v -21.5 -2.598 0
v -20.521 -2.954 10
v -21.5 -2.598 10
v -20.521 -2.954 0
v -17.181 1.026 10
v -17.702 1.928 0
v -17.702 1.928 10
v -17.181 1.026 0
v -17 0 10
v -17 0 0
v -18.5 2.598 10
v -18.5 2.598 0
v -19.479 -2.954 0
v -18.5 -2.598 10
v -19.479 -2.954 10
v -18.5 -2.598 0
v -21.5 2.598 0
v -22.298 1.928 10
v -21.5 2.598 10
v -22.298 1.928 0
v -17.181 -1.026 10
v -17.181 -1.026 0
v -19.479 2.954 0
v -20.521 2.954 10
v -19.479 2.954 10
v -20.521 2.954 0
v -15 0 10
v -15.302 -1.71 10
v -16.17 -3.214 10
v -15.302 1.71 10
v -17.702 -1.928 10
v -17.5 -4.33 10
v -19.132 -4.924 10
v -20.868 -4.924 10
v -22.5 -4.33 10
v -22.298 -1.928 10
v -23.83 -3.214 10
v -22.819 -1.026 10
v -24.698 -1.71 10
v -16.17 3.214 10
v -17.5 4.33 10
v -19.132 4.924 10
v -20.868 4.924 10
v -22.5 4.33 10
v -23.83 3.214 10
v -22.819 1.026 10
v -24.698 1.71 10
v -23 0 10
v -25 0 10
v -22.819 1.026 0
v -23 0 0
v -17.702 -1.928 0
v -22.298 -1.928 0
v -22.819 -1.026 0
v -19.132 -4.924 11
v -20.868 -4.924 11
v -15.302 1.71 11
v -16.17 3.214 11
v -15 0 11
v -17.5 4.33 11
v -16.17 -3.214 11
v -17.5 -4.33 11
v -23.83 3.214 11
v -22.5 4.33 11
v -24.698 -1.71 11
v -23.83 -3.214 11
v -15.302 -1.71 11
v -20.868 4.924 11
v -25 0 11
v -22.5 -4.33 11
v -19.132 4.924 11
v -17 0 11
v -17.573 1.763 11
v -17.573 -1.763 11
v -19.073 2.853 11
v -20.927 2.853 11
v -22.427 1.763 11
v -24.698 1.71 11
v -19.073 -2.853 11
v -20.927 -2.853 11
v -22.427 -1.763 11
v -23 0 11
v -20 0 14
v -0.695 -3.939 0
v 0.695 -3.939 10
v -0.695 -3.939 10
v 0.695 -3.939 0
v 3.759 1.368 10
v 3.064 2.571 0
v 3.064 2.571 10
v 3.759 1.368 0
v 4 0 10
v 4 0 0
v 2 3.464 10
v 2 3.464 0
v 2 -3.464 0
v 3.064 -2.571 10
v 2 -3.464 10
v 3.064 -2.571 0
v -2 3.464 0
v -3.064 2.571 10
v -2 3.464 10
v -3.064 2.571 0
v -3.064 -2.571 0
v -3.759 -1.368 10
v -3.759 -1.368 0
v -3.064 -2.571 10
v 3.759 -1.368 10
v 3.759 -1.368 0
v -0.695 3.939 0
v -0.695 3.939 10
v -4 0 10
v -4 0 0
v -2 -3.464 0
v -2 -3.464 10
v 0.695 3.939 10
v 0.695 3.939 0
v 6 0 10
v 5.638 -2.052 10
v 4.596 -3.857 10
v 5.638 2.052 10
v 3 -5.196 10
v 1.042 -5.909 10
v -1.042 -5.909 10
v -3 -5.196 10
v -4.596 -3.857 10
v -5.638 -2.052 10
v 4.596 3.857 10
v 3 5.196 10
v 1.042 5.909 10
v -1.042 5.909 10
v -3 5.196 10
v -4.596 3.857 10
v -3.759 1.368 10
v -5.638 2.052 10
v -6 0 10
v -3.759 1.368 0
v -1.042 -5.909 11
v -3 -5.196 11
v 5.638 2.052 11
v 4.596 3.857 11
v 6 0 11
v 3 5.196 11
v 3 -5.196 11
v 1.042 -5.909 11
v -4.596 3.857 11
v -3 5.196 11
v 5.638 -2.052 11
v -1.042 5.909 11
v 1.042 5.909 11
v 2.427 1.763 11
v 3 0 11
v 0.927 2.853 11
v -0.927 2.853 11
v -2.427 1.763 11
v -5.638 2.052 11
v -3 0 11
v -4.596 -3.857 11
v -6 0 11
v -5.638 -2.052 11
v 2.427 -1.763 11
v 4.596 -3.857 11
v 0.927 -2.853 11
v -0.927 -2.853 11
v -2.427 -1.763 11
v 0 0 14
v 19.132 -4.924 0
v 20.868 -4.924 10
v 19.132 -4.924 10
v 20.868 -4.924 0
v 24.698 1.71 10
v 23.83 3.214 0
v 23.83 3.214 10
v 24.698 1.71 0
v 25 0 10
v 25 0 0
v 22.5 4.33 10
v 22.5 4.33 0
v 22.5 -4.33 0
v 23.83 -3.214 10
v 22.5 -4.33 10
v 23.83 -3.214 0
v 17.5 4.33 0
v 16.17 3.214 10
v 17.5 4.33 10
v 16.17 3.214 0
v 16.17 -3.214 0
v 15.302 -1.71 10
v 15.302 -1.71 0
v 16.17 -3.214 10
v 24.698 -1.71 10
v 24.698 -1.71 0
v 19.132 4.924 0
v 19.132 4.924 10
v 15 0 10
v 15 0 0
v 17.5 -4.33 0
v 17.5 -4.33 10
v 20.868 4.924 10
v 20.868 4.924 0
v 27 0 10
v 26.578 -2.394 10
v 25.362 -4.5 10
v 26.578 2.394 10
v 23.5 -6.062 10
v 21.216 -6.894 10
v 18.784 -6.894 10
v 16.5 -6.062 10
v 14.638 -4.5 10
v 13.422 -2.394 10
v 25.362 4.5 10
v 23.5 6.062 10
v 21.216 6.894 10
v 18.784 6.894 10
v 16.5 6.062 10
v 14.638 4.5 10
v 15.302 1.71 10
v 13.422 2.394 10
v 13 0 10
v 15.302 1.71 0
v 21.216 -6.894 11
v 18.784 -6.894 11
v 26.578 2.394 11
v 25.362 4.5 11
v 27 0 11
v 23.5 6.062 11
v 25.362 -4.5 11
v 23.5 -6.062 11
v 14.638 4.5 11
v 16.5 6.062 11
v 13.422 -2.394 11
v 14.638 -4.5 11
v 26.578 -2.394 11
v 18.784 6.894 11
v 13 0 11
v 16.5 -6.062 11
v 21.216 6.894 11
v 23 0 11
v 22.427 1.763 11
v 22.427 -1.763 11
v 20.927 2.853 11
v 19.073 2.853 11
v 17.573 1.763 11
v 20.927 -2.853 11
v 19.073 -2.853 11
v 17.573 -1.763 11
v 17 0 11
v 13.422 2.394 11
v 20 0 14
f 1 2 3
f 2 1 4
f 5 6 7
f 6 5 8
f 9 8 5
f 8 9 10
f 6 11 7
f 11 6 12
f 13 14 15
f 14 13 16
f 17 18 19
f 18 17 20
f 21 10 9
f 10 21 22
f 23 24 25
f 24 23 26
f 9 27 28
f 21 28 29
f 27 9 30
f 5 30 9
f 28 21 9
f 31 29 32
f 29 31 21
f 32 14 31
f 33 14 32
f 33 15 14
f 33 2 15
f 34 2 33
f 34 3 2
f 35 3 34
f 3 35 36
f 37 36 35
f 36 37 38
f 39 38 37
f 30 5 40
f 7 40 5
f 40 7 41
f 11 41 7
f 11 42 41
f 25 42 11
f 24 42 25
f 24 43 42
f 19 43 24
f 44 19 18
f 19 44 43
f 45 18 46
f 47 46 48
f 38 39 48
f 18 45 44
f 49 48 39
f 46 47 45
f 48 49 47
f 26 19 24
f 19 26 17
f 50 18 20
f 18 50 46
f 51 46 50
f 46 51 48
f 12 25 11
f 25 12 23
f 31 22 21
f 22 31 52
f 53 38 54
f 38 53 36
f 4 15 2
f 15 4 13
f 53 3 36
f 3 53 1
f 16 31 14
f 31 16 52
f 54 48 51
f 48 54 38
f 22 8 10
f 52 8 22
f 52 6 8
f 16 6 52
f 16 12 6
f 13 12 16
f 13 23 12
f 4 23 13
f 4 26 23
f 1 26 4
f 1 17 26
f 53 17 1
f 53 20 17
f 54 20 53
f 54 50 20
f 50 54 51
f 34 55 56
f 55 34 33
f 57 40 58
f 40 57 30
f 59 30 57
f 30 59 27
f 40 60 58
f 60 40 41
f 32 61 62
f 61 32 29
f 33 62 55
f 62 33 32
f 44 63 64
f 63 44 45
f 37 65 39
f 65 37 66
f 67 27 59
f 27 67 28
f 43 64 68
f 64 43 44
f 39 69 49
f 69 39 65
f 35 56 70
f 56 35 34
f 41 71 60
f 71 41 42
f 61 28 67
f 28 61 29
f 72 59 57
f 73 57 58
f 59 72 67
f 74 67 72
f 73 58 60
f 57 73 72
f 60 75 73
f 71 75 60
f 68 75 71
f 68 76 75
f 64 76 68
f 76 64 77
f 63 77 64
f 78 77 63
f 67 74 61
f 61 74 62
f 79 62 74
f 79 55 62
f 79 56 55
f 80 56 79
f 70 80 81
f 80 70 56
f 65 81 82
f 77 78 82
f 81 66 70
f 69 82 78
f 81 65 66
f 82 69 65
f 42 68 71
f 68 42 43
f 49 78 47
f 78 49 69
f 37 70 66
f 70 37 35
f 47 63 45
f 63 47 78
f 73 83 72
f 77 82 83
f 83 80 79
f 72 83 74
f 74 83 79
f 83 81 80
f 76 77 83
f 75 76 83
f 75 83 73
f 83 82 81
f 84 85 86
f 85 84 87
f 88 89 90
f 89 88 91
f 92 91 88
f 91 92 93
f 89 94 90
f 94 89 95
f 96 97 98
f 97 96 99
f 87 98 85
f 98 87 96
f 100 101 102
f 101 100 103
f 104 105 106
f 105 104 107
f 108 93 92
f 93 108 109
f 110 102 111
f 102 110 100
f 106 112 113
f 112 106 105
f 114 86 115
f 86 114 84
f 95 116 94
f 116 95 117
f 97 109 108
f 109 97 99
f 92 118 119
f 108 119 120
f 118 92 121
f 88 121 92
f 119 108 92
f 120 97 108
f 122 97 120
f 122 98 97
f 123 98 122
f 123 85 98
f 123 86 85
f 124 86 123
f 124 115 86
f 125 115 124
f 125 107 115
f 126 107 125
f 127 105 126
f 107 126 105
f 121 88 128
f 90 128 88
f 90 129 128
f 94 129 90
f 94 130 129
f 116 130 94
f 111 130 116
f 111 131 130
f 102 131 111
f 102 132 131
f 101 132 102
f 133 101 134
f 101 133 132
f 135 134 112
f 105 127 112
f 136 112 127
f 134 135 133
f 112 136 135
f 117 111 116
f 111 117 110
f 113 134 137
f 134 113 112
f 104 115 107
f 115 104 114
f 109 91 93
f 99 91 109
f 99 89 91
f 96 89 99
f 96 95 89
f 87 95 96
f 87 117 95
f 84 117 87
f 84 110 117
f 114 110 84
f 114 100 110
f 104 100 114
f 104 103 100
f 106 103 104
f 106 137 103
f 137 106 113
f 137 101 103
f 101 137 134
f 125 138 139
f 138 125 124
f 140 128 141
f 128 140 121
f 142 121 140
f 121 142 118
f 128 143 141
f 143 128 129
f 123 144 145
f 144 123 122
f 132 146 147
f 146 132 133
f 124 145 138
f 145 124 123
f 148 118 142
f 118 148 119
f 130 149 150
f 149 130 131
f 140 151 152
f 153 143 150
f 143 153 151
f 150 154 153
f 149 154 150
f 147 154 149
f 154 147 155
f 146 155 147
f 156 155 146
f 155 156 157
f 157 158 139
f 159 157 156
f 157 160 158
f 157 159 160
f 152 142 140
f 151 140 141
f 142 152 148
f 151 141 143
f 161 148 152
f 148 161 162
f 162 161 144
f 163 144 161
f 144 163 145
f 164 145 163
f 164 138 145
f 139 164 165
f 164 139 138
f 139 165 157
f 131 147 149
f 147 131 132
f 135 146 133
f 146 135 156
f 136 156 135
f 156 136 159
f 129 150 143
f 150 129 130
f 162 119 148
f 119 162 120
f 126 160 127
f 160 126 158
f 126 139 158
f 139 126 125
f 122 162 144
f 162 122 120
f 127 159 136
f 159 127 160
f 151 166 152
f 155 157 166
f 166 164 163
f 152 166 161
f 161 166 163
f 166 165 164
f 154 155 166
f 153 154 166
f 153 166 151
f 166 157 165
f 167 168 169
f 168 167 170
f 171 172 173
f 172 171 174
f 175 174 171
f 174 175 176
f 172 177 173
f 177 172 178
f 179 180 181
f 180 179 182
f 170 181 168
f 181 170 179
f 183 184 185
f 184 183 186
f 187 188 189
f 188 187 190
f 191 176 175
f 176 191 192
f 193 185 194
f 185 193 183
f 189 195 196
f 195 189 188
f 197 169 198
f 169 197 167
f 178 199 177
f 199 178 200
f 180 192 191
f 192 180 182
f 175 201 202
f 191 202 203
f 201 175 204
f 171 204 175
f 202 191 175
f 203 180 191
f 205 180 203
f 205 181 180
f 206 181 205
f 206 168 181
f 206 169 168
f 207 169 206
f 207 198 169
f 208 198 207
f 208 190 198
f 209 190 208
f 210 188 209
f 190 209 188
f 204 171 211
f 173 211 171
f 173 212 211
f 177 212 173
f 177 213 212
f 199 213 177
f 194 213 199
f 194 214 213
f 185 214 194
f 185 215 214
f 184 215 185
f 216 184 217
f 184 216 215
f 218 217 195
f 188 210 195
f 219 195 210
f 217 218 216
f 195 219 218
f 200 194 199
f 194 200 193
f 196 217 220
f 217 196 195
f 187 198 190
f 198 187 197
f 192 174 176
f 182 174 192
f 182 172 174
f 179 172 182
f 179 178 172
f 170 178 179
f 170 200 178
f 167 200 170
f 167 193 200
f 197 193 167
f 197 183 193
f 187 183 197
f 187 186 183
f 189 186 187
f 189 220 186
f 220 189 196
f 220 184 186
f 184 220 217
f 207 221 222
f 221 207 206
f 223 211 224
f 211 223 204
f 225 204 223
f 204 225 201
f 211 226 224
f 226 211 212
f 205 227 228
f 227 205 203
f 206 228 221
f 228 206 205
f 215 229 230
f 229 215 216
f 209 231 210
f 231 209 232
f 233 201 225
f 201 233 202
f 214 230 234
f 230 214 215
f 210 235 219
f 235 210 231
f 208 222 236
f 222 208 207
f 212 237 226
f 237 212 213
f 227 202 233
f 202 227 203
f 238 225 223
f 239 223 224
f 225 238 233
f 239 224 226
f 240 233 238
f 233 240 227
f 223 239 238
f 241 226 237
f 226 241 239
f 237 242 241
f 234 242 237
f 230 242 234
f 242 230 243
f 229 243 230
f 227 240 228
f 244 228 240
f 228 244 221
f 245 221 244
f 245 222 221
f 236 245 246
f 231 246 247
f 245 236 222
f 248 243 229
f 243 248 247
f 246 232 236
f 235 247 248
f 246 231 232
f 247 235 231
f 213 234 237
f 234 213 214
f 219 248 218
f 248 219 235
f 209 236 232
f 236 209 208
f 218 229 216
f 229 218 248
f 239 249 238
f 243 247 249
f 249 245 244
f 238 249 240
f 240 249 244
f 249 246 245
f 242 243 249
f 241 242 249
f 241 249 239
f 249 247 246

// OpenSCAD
//----------------------------------------------------------------------------

translate([-20, 0, 0])
marker(6);

translate([0, 0, 0])
marker(8);

translate([20, 0, 0])
marker(10);

//----------------------------------------------------------------------------

module marker(width, height = 10, pin = 3) {
  rim_width = width + 2 * 2;
  rim_height = 1;

  cylinder(d = width, h = height, $fn = 18);

  translate([0, 0, height])
  cylinder(d = rim_width, h = rim_height, $fn = 18);

  translate([0, 0, height + rim_height])
  cylinder(h = pin, r1 = pin, r2 = 0);
}

//----------------------------------------------------------------------------
// vim:ft=openscad
